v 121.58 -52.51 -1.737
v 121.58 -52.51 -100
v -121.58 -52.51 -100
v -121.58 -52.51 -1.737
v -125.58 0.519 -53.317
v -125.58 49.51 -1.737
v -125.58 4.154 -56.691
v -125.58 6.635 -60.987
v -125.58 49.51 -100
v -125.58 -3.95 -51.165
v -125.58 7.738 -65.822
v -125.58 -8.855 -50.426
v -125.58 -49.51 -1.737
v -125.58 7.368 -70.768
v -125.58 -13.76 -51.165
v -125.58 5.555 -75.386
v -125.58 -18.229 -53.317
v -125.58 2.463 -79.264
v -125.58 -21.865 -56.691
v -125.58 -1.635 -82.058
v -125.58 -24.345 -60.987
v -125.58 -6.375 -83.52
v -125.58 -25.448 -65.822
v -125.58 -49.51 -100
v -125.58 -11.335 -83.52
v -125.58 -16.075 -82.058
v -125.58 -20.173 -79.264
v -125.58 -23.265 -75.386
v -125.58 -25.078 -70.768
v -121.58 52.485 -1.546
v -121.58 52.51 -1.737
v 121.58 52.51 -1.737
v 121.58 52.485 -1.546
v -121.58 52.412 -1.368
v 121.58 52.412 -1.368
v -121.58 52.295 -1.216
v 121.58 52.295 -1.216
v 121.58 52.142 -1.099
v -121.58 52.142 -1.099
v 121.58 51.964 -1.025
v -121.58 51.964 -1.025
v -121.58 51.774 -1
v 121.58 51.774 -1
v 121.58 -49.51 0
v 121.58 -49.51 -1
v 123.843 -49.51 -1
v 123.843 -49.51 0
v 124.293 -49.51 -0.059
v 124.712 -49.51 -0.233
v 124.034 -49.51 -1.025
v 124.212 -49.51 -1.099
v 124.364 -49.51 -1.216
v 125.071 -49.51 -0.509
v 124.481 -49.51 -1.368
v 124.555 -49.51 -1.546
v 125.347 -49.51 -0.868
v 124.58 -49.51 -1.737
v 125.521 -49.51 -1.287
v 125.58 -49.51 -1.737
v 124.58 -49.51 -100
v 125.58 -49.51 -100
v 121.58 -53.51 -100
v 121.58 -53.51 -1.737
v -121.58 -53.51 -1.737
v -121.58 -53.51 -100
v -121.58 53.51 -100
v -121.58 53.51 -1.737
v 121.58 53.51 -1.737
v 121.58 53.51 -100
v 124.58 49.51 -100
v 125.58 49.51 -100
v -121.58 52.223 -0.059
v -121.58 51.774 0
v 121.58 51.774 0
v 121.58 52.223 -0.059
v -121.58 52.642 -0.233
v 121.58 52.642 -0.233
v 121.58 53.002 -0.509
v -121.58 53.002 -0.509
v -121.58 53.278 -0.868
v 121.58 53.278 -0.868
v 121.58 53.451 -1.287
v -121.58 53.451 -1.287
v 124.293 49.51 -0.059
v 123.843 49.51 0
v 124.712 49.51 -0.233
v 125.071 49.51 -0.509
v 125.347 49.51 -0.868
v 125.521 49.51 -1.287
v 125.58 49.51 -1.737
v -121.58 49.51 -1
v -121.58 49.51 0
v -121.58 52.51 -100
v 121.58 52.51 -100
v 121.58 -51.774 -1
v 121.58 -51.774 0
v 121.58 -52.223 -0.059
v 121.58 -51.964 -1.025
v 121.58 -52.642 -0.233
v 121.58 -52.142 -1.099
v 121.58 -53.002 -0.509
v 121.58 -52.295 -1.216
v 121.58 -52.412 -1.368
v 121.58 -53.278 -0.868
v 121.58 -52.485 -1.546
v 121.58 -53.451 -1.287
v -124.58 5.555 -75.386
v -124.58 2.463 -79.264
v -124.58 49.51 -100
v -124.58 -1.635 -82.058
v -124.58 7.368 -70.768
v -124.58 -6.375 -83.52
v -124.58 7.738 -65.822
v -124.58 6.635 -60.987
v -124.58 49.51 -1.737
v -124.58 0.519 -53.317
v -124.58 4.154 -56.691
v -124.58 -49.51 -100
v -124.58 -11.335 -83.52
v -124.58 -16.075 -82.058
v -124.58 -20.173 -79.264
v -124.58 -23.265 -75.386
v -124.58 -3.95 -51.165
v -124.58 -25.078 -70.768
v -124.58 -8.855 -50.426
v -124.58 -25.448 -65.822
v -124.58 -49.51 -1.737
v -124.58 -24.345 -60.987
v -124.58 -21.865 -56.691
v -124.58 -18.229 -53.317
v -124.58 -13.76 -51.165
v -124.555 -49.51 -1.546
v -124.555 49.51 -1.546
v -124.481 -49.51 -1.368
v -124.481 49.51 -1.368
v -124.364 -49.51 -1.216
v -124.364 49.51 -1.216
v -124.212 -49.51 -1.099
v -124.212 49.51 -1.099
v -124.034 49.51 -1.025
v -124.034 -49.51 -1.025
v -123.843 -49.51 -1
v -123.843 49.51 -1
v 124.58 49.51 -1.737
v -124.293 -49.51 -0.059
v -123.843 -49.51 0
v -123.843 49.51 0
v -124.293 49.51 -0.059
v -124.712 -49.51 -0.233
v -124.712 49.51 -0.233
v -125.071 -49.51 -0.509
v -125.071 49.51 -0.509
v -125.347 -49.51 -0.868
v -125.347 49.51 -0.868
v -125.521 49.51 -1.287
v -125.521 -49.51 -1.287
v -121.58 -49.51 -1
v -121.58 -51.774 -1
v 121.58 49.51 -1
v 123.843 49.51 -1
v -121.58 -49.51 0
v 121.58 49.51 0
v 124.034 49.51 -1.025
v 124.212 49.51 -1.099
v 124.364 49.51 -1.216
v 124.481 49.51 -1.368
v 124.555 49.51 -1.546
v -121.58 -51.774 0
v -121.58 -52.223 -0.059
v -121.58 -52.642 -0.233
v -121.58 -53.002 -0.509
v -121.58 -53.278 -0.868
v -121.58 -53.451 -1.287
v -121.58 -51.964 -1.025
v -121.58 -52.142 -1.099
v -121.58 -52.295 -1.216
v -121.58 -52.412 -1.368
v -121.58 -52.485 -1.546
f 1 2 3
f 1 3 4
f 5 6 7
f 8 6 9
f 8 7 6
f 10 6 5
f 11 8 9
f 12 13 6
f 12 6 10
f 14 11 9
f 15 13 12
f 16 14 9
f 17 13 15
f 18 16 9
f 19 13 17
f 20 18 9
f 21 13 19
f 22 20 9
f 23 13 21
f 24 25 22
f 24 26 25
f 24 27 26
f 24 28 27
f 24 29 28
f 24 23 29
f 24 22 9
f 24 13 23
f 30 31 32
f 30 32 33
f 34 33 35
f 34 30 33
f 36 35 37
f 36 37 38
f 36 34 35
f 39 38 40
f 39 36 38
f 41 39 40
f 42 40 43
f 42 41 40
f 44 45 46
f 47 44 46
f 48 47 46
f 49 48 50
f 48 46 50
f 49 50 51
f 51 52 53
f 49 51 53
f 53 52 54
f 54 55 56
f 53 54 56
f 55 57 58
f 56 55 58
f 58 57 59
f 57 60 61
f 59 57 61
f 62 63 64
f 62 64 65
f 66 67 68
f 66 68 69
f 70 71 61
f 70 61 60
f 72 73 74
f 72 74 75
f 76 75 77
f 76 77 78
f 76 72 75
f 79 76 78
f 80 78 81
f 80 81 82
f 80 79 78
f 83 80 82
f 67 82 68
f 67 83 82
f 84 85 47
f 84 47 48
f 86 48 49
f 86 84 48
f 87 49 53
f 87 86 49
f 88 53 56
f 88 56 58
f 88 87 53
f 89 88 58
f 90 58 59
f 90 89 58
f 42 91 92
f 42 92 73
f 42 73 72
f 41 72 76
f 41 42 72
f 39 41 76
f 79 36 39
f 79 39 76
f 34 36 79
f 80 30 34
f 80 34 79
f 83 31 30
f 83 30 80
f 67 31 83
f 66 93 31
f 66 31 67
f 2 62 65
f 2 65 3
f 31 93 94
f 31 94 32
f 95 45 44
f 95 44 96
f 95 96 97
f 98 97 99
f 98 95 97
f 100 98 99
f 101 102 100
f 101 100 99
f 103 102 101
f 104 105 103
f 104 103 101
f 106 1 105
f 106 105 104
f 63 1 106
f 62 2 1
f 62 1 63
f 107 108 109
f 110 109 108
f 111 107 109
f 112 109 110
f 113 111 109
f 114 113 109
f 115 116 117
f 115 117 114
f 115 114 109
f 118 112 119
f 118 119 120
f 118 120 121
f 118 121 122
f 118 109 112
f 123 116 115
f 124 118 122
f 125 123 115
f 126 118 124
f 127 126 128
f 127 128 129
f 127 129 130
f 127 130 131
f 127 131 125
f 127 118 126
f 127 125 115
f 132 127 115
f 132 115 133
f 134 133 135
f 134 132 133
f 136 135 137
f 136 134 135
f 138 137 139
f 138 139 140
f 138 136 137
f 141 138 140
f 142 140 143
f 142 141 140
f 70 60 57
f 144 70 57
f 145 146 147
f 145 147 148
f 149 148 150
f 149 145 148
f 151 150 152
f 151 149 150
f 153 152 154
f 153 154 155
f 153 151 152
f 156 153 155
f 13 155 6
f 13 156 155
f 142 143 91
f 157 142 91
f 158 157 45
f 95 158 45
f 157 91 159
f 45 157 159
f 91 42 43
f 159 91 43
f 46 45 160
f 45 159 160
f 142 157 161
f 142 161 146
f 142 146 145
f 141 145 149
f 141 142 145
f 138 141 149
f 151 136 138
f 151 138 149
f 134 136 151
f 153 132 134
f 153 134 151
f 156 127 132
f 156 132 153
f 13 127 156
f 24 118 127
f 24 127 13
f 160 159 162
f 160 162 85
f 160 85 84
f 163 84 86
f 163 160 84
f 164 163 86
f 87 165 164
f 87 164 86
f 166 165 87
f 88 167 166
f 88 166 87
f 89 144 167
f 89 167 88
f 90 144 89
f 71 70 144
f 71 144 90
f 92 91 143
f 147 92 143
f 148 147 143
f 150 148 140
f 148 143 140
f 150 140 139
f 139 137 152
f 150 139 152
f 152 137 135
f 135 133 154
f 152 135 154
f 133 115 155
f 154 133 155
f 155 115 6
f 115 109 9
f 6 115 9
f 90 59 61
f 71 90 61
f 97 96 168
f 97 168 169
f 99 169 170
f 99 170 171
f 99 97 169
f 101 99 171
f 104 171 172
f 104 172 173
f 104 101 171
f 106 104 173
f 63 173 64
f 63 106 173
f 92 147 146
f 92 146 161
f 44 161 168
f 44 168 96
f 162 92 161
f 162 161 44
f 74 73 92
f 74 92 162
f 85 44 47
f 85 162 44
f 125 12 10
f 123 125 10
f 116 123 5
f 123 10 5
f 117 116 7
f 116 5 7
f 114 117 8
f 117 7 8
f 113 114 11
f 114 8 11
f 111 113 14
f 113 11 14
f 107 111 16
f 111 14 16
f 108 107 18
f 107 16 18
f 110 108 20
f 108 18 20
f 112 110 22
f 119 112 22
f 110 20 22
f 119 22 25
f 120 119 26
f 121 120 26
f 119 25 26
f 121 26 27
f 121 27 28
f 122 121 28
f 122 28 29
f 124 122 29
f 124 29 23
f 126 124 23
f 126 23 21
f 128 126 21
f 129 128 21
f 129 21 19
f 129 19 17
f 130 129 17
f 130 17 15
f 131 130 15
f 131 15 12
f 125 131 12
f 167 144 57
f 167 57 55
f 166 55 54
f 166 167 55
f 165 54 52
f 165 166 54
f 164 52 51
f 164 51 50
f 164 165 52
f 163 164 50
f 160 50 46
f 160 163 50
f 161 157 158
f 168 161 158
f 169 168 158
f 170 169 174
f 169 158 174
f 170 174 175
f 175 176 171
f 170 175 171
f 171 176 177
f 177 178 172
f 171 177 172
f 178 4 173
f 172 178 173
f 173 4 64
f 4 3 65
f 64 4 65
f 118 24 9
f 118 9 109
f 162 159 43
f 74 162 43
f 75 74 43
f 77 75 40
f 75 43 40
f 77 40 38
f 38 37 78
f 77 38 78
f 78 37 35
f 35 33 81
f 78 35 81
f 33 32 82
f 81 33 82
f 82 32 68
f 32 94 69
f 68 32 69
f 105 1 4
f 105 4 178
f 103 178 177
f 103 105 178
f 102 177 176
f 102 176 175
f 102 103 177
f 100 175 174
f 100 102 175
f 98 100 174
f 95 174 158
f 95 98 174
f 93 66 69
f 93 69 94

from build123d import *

# Parameters (mm, degrees)
SM_START                         = -1
SM_BASE_FLANGE_1_DEPTH           = 1
SM_EDGE_FLANGE_1_STRIP_W         = 5.4732
SM_EDGE_FLANGE_1_STRIP_H         = 1
SM_EDGE_FLANGE_1_STRIP_CUT_DEPTH = 243.159735698
SM_EDGE_FLANGE_1_DEPTH           = 243.159735698
SM_EDGE_FLANGE_2_STRIP_W         = 5.4732
SM_EDGE_FLANGE_2_STRIP_H         = 1
SM_EDGE_FLANGE_2_STRIP_CUT_DEPTH = 99.02081528
SM_EDGE_FLANGE_2_DEPTH           = 99.02081528
SM_EDGE_FLANGE_3_STRIP_W         = 5.4732
SM_EDGE_FLANGE_3_STRIP_H         = 1
SM_EDGE_FLANGE_3_STRIP_CUT_DEPTH = 99.02081528
SM_EDGE_FLANGE_3_DEPTH           = 99.02081528
SM_EDGE_FLANGE_4_STRIP_W         = 5.4732
SM_EDGE_FLANGE_4_STRIP_H         = 1
SM_EDGE_FLANGE_4_STRIP_CUT_DEPTH = 243.159735698
SM_EDGE_FLANGE_4_DEPTH           = 243.159735698
CUT_EXTRUDE_1_REACH              = 277.58
SKETCH_18_R                      = 16.639768722


# Read off the part's stored shape, not the designer's step: Базовая кромка1
# Sheet-metal steps are written as plain solids
with BuildPart() as part:
    # Базовая кромка1 outline → Базовая кромка1 (new body)
    with BuildSketch(Plane.XY.offset(SM_START)):
        Polygon((-121.579867849, 49.51040764), (-125.579867849, 49.51040764), (-125.579867849, -49.51040764), (-121.579867849, -49.51040764), (-121.579867849, -53.51040764), (121.579867849, -53.51040764), (121.579867849, -49.51040764), (125.579867849, -49.51040764), (125.579867849, 49.51040764), (121.579867849, 49.51040764), (121.579867849, 53.51040764), (-121.579867849, 53.51040764), align=None)
    extrude(amount=SM_BASE_FLANGE_1_DEPTH)

    # Ребро-кромка1 strip (across the edge) → Ребро-кромка1 strip cut (cut)
    with BuildSketch(Plane(origin=(-121.579867849, 53.51040764, -1), x_dir=(0, -1, 0), z_dir=(1, 0, 0))):
        with Locations((-1, -0.5)):
            Rectangle(SM_EDGE_FLANGE_1_STRIP_W, SM_EDGE_FLANGE_1_STRIP_H)
    extrude(amount=SM_EDGE_FLANGE_1_STRIP_CUT_DEPTH, mode=Mode.SUBTRACT)

    # Ребро-кромка1 section (across the edge) → Ребро-кромка1 (add)
    with BuildSketch(Plane(origin=(-121.579867849, 53.51040764, -1), x_dir=(0, -1, 0), z_dir=(1, 0, 0))):
        with BuildLine():
            Line((0, 0.7366), (0, 99))
            Line((0, 99), (1, 99))
            Line((1, 99), (1, 0.7366))
            ThreePointArc((1, 0.7366), (1.215745145, 0.215745145), (1.7366, 0))
            Line((1.7366, 0), (1.7366, -1))
            ThreePointArc((1.7366, -1), (0.508638364, -0.491361636), (0, 0.7366))
        make_face()
    extrude(amount=SM_EDGE_FLANGE_1_DEPTH)

    # Ребро-кромка2 strip (across the edge) → Ребро-кромка2 strip cut (cut)
    with BuildSketch(Plane(origin=(-125.579867849, -49.51040764, -1), x_dir=(1, 0, 0), z_dir=(0, 1, 0))):
        with Locations((-1, -0.5)):
            Rectangle(SM_EDGE_FLANGE_2_STRIP_W, SM_EDGE_FLANGE_2_STRIP_H)
    extrude(amount=SM_EDGE_FLANGE_2_STRIP_CUT_DEPTH, mode=Mode.SUBTRACT)

    # Ребро-кромка2 section (across the edge) → Ребро-кромка2 (add)
    with BuildSketch(Plane(origin=(-125.579867849, -49.51040764, -1), x_dir=(1, 0, 0), z_dir=(0, 1, 0))):
        with BuildLine():
            Line((0, 0.7366), (0, 99))
            Line((0, 99), (1, 99))
            Line((1, 99), (1, 0.7366))
            ThreePointArc((1, 0.7366), (1.215745145, 0.215745145), (1.7366, 0))
            Line((1.7366, 0), (1.7366, -1))
            ThreePointArc((1.7366, -1), (0.508638364, -0.491361636), (0, 0.7366))
        make_face()
    extrude(amount=SM_EDGE_FLANGE_2_DEPTH)

    # Ребро-кромка3 strip (across the edge) → Ребро-кромка3 strip cut (cut)
    with BuildSketch(Plane(origin=(125.579867849, 49.51040764, -1), x_dir=(-1, 0, 0), z_dir=(0, -1, 0))):
        with Locations((-1, -0.5)):
            Rectangle(SM_EDGE_FLANGE_3_STRIP_W, SM_EDGE_FLANGE_3_STRIP_H)
    extrude(amount=SM_EDGE_FLANGE_3_STRIP_CUT_DEPTH, mode=Mode.SUBTRACT)

    # Ребро-кромка3 section (across the edge) → Ребро-кромка3 (add)
    with BuildSketch(Plane(origin=(125.579867849, 49.51040764, -1), x_dir=(-1, 0, 0), z_dir=(0, -1, 0))):
        with BuildLine():
            Line((0, 0.7366), (0, 99))
            Line((0, 99), (1, 99))
            Line((1, 99), (1, 0.7366))
            ThreePointArc((1, 0.7366), (1.215745145, 0.215745145), (1.7366, 0))
            Line((1.7366, 0), (1.7366, -1))
            ThreePointArc((1.7366, -1), (0.508638364, -0.491361636), (0, 0.7366))
        make_face()
    extrude(amount=SM_EDGE_FLANGE_3_DEPTH)

    # Ребро-кромка4 strip (across the edge) → Ребро-кромка4 strip cut (cut)
    with BuildSketch(Plane(origin=(121.579867849, -53.51040764, -1), x_dir=(0, 1, 0), z_dir=(-1, 0, 0))):
        with Locations((-1, -0.5)):
            Rectangle(SM_EDGE_FLANGE_4_STRIP_W, SM_EDGE_FLANGE_4_STRIP_H)
    extrude(amount=SM_EDGE_FLANGE_4_STRIP_CUT_DEPTH, mode=Mode.SUBTRACT)

    # Ребро-кромка4 section (across the edge) → Ребро-кромка4 (add)
    with BuildSketch(Plane(origin=(121.579867849, -53.51040764, -1), x_dir=(0, 1, 0), z_dir=(-1, 0, 0))):
        with BuildLine():
            Line((0, 0.7366), (0, 99))
            Line((0, 99), (1, 99))
            Line((1, 99), (1, 0.7366))
            ThreePointArc((1, 0.7366), (1.215745145, 0.215745145), (1.7366, 0))
            Line((1.7366, 0), (1.7366, -1))
            ThreePointArc((1.7366, -1), (0.508638364, -0.491361636), (0, 0.7366))
        make_face()
    extrude(amount=SM_EDGE_FLANGE_4_DEPTH)

    # Эскиз18 → Вырез-Вытянуть1 (cut, up to next)
    with BuildSketch(Plane.ZY.offset(125.579867849), mode=Mode.PRIVATE) as cut_extrude_1_sk1:
        with Locations((-67.065719066, -8.85501242)):
            Circle(SKETCH_18_R)
    cut_extrude_1_tool1 = extrude(cut_extrude_1_sk1.sketch, amount=-CUT_EXTRUDE_1_REACH, mode=Mode.PRIVATE) & part.part
    add(cut_extrude_1_tool1.solids().sort_by_distance((-125.579868, -8.855012, -67.065719))[0], mode=Mode.SUBTRACT)


solid = part.part
